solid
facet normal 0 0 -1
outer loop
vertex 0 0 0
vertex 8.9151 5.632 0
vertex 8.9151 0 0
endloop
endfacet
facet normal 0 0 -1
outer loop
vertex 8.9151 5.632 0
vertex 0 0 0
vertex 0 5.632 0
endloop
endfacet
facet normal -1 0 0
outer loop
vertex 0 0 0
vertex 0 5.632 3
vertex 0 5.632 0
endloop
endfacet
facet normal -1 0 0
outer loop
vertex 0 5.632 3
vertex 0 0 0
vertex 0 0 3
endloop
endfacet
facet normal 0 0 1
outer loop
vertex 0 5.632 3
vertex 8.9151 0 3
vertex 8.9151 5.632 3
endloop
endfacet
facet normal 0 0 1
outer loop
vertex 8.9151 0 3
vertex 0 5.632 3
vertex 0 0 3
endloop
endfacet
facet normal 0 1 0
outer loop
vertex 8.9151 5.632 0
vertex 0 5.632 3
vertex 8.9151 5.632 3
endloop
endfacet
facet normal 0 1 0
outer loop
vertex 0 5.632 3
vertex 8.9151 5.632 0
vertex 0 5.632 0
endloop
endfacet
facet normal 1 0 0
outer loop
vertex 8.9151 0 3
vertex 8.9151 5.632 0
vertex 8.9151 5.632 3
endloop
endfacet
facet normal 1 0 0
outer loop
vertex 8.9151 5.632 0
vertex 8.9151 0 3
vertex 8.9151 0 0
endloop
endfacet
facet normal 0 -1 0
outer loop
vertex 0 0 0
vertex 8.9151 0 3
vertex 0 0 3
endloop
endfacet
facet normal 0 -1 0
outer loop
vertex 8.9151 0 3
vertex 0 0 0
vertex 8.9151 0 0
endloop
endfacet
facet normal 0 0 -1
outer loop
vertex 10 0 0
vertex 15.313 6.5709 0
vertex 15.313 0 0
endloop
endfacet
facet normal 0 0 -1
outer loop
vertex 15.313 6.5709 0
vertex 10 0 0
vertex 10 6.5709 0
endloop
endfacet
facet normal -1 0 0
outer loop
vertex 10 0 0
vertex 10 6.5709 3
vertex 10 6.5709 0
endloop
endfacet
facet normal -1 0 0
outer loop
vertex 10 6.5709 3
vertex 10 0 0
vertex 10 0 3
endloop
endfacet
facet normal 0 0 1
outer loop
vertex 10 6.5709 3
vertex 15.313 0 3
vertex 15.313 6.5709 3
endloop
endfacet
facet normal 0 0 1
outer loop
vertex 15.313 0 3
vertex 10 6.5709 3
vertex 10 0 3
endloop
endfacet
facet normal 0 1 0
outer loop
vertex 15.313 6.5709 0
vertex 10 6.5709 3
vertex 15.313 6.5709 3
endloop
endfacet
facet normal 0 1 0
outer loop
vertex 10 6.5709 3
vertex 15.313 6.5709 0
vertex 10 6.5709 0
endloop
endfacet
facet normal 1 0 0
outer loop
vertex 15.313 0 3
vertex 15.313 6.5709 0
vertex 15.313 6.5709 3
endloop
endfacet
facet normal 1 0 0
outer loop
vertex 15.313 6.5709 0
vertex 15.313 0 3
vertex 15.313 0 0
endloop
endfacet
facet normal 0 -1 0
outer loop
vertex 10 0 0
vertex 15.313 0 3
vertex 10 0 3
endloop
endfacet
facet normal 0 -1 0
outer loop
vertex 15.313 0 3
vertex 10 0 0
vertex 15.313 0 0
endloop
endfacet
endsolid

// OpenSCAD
// get a single number


module Bricks(){
colors = ["#cb6b6b","#dd7d7d","#9e3333","#842020"];



single_rand = rands(5,10,1)[0];
single_rand2 = rands(5,10,1)[0];

index_color = rands(0,3,1)[0];

color(colors[index_color])
linear_extrude(height = 3){
square([single_rand,single_rand2]);
}


}


Bricks();

translate([10,0,0])
Bricks();
